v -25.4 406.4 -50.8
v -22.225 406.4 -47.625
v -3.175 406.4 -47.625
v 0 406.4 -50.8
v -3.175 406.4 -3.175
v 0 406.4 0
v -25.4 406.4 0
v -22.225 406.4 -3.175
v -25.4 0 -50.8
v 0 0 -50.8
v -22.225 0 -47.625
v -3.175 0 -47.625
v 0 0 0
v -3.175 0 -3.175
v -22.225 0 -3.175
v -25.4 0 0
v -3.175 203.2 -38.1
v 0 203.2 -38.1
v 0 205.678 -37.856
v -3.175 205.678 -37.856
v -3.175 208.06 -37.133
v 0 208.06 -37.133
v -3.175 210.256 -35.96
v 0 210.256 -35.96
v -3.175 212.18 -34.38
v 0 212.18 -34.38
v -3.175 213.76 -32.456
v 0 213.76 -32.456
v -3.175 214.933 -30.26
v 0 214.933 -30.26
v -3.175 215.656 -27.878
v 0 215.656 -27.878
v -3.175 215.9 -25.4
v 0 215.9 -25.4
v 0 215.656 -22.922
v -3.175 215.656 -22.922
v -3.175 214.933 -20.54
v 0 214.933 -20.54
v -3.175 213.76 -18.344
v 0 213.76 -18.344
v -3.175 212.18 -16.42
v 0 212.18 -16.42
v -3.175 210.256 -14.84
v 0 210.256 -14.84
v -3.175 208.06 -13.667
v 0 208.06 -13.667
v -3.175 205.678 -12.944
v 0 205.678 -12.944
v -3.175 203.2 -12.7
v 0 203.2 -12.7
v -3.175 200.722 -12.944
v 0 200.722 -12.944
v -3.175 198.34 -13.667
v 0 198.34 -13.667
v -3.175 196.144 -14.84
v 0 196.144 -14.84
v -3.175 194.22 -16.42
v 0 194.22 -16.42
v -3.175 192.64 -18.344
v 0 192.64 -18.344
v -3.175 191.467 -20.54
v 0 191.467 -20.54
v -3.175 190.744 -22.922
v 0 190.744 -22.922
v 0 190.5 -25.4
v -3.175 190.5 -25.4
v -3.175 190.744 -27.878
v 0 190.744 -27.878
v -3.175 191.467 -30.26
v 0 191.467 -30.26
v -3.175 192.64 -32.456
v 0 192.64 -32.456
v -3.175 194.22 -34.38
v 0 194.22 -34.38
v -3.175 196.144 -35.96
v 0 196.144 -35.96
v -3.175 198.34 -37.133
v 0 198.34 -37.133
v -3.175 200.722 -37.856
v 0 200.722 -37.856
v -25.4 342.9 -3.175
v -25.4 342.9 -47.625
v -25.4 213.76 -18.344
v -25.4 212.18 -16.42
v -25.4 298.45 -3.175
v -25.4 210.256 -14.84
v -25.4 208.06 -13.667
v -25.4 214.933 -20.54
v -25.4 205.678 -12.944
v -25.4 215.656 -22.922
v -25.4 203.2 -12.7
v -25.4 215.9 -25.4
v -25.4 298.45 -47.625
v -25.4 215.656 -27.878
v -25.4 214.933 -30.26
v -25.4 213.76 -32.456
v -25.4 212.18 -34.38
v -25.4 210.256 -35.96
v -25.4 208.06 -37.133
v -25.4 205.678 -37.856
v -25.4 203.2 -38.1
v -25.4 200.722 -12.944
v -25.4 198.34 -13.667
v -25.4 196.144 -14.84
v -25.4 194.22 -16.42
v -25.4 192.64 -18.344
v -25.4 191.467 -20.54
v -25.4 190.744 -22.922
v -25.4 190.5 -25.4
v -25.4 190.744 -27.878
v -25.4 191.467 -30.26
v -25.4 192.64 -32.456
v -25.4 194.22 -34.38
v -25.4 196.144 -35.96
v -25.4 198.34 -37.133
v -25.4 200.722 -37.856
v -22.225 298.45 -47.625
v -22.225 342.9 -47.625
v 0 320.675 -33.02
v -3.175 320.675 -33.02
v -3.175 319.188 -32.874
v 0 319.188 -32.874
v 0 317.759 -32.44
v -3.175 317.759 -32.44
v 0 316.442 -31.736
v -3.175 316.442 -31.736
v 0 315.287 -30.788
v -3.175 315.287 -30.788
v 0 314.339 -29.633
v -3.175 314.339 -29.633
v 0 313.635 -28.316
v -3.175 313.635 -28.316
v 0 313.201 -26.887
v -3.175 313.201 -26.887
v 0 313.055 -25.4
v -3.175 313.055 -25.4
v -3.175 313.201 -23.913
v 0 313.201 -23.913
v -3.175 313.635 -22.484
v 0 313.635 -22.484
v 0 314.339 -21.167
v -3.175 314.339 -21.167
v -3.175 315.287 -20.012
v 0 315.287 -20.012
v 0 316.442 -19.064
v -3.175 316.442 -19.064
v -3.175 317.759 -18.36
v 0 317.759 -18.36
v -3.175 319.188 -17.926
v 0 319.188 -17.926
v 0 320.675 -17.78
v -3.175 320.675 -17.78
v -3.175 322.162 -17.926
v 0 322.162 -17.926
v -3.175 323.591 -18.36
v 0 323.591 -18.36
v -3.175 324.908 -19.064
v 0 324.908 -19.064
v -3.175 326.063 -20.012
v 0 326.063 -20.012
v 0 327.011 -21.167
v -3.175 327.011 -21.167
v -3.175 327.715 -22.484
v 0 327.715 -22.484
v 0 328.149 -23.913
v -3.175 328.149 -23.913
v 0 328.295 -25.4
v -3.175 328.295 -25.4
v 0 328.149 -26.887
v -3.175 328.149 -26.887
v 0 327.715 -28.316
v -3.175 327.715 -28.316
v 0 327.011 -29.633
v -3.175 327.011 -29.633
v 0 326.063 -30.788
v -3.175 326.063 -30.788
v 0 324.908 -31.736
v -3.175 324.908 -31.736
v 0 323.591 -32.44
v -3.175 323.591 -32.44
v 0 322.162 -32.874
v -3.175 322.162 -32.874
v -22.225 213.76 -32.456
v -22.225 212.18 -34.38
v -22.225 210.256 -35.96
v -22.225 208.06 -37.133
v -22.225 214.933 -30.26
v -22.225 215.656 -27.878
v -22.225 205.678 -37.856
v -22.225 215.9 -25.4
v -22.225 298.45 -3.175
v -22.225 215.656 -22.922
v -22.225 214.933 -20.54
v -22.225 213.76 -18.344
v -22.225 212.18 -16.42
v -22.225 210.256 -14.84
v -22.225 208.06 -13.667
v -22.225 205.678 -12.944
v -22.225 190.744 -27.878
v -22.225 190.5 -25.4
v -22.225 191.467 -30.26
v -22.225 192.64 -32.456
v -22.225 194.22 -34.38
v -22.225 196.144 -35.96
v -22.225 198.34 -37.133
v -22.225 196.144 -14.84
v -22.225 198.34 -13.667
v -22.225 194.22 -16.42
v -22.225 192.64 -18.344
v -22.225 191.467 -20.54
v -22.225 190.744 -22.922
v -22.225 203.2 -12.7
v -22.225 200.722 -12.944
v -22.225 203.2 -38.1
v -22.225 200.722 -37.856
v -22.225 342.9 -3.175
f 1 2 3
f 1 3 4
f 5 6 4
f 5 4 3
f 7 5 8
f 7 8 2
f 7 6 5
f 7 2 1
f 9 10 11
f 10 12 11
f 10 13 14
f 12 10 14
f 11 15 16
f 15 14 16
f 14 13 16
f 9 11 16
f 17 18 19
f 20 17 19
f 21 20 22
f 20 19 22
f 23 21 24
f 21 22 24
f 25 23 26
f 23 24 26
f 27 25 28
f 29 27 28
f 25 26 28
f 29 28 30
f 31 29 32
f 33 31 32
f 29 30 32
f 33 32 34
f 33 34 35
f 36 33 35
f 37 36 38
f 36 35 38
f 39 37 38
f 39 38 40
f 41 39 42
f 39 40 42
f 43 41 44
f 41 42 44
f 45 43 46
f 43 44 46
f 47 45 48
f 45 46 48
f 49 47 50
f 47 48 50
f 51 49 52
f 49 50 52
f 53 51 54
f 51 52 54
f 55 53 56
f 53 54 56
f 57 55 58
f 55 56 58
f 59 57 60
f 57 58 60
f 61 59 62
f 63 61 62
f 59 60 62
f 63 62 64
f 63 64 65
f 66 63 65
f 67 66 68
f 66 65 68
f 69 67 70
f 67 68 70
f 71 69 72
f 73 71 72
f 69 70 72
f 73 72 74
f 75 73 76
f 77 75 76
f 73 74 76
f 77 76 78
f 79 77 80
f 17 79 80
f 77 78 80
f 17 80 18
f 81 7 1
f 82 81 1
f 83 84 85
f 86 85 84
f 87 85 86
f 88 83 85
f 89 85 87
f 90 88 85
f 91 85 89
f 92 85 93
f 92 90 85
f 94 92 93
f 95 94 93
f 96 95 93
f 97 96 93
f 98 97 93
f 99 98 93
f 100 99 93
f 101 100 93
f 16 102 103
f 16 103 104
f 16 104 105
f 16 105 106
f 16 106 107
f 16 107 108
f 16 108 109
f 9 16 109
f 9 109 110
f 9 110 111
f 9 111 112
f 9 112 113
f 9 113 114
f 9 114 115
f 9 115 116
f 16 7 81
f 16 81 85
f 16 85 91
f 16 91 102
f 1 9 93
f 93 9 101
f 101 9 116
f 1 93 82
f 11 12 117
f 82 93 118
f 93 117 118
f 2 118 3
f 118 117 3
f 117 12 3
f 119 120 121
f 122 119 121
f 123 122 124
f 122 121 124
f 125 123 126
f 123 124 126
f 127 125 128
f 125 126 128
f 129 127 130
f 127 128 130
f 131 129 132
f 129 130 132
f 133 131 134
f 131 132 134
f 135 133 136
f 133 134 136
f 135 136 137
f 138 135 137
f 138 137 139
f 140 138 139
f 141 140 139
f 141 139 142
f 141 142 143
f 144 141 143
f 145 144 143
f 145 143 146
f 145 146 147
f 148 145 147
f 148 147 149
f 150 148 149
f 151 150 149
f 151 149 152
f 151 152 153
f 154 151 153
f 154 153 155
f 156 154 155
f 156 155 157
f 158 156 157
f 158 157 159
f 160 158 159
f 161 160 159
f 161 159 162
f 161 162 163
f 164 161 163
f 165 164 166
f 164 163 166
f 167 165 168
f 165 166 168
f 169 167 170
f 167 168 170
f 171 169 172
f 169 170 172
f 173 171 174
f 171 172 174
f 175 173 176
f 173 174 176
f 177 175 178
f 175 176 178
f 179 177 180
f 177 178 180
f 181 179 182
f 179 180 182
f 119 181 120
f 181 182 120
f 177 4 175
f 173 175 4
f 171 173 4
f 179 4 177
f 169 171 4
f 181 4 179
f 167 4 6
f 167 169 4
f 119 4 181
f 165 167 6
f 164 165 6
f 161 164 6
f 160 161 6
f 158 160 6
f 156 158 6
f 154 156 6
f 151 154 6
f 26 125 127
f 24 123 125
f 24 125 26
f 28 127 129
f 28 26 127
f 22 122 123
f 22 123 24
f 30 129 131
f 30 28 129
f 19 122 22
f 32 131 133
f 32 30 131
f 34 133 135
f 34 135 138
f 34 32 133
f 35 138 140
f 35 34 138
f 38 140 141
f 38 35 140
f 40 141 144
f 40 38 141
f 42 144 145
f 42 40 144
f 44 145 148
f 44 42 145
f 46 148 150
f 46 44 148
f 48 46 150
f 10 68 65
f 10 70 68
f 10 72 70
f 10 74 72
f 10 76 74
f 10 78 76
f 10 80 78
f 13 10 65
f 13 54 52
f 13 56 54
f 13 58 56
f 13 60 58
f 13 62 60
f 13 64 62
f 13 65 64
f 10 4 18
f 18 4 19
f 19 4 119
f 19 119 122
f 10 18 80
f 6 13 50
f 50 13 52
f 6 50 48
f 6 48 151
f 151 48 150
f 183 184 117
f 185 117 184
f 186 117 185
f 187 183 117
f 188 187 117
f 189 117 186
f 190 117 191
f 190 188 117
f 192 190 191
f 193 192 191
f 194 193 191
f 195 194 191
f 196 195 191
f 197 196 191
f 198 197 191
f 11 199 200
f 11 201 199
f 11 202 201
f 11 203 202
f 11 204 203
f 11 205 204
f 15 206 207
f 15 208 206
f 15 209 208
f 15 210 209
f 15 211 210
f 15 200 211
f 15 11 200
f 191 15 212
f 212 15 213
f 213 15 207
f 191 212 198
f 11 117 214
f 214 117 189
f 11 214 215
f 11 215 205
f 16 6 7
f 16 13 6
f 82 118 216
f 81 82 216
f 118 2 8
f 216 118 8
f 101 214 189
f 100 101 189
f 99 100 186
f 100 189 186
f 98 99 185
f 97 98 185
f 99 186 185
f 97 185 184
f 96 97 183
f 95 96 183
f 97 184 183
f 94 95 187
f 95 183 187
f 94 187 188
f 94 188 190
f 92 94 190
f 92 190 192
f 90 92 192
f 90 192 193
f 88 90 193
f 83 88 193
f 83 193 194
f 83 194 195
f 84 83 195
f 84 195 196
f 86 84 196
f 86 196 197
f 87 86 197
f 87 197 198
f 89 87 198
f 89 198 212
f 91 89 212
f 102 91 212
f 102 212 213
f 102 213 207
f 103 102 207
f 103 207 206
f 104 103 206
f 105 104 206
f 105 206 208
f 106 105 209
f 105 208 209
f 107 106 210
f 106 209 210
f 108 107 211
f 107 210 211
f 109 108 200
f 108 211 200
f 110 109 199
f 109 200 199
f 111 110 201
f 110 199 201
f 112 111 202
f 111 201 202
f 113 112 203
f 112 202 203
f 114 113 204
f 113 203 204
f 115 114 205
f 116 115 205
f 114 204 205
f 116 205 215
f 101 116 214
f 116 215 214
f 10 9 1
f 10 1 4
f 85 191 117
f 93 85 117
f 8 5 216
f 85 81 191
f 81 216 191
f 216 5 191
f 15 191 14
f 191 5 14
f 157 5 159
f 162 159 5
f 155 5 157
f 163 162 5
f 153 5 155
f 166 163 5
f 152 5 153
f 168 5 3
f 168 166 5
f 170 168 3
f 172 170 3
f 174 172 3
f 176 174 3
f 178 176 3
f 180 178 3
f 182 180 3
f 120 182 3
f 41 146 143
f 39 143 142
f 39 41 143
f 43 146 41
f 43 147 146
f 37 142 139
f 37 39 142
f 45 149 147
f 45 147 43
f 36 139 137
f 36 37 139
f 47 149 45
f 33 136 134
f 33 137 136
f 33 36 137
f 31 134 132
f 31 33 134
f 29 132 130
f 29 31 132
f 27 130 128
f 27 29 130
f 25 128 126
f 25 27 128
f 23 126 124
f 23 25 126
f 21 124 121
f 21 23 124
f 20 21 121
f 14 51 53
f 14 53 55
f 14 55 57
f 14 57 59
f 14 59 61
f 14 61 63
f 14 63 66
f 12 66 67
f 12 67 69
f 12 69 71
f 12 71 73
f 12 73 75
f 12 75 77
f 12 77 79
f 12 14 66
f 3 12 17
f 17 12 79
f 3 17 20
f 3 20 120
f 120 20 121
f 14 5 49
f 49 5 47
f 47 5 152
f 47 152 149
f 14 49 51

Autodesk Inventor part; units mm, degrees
ref_plane "YZ Plane" through (0, 0, 0) normal (1, 0, 0) x (0, 1, 0)
ref_plane "XZ Plane" through (0, 0, 0) normal (0, 1, 0) x (-1, 0, 0)
ref_plane "XY Plane" through (0, 0, 0) normal (0, 0, 1) x (1, 0, 0)
sketch "Sketch1" plane through (0, 0, 0) normal (0, 1, 0) x (-1, 0, 0)
  line L0 (0, 0) -> (25.4, 0)
  line L1 (25.4, 0) -> (25.4, -50.8)
  line L2 (25.4, -50.8) -> (0, -50.8)
  line L3 (0, -50.8) -> (0, 0)
  line L4 (22.225, -47.625) -> (22.225, -3.175)
  line L5 (22.225, -3.175) -> (3.175, -3.175)
  line L6 (3.175, -3.175) -> (3.175, -47.625)
  line L7 (3.175, -47.625) -> (22.225, -47.625)
  dimension "d0" = 50.8
  dimension "d1" = 25.4
  dimension "d2" = 3.175
extrude "Extrusion1" add sketch "Sketch1" along normal blind 406.4
sketch "Sketch2" plane through (0, 0, 0) normal (1, 0, 0) x (0, 0, -1)
  circle A0 centre (25.4, 203.2) radius 12.7
  line L0 (0, 0) -> (0, 406.4) projected
  line L1 (50.8, 0) -> (0, 0) projected
  dimension "d5" = 25.4
  dimension "d6" = 25.4
  dimension "d7" = 203.2
extrude "Extrusion2" cut sketch "Sketch2" against normal blind 25.4
sketch "Sketch4" plane through (-22.225, 0, -47.625) normal (1, 0, 0) x (0, 0, -1)
  circle A0 centre (-22.225, 320.675) radius 7.62
  line L0 (-47.625, 406.4) -> (3.175, 406.4) projected
  line L1 (-47.625, 0) -> (-47.625, 406.4) projected
  dimension "d15" = 25.4
  dimension "d16" = 15.24
  dimension "d25" = 85.725
extrude "Extrusion4" cut sketch "Sketch4" along normal blind 25.4
sketch "Sketch5" plane through (-22.225, 0, -47.625) normal (1, 0, 0) x (0, 0, -1)
  line L0 (0, 342.9) -> (-44.45, 342.9)
  line L1 (-44.45, 342.9) -> (-44.45, 298.45)
  line L2 (-44.45, 298.45) -> (0, 298.45)
  line L3 (0, 298.45) -> (0, 342.9)
  line L4 (0, 342.9) -> (0, 298.45) projected
  line L5 (-44.45, 298.45) -> (-44.45, 342.9) projected
  line L6 (0, 298.45) -> (-44.45, 298.45) projected
  line L7 (-44.45, 342.9) -> (0, 342.9) projected
  point P0 (-47.625, 0)
  dimension "d19" = 0
  dimension "d20" = 0
  dimension "d21" = 0
  dimension "d22" = 0
extrude "Extrusion5" cut sketch "Sketch5" against normal blind 25.4
properties part number "2x1 16in Aluminum-ver2-1111-2020"
